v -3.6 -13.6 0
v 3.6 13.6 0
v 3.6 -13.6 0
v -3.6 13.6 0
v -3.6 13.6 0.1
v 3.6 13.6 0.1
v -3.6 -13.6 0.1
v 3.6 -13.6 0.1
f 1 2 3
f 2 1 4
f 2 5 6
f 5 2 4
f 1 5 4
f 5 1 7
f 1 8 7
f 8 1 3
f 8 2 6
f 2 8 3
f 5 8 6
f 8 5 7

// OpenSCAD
// file: ../p/box5-12.scad
use <../lib.scad>
function ldraw_lib__box5_12() = [
// 0 Box with 5 Faces without Any Edges
// 0 Name: box5-12.dat
// 0 Author: Chris Dee [cwdee]
// 0 !LDRAW_ORG Primitive UPDATE 2009-02
// 0 !LICENSE Licensed under CC BY 2.0 and CC BY 4.0 : see CAreadme.txt
// 
// 0 BFC CERTIFY CCW
  [0,"BFC","CERTIFY"],
  [0,"BFC","CCW"],
// 
// 0 !HISTORY 2009-09-03 [PTadmin] Official Update 2009-02
// 
// 
// 4 16 1 1 1 1 1 -1 -1 1 -1 -1 1 1
  [4,16,1,1,1,1,1,-1,-1,1,-1,-1,1,1],
// 4 16 -1 0 1 1 0 1 1 1 1 -1 1 1
  [4,16,-1,0,1,1,0,1,1,1,1,-1,1,1],
// 4 16 -1 0 -1 -1 0 1 -1 1 1 -1 1 -1
  [4,16,-1,0,-1,-1,0,1,-1,1,1,-1,1,-1],
// 4 16 1 0 -1 -1 0 -1 -1 1 -1 1 1 -1
  [4,16,1,0,-1,-1,0,-1,-1,1,-1,1,1,-1],
// 4 16 1 0 1 1 0 -1 1 1 -1 1 1 1
  [4,16,1,0,1,1,0,-1,1,1,-1,1,1,1],
// 0
];
makepoly(ldraw_lib__box5_12(), line=0.2);
// main file
use <../lib.scad>
use <../p/box5-12.scad>
function ldraw_lib__6153754q() = [
// 0 Sticker  3.4 x  0.9 with Dark Azure Volkswagen Rear Window Shape
// 0 Name: 6153754q.dat
// 0 Author: Magnus Forsberg [MagFors]
// 0 !LDRAW_ORG Part UPDATE 2016-01
// 0 !LICENSE Licensed under CC BY 2.0 and CC BY 4.0 : see CAreadme.txt
// 
// 0 BFC CERTIFY CCW
  [0,"BFC","CERTIFY"],
  [0,"BFC","CCW"],
// 
// 0 !KEYWORDS Beetle, set 10252, VW
// 
// 0 !HISTORY 2016-12-31 [PTadmin] Official Update 2016-01
// 
// 
// 1 16 0 -0.25 0 9 0 0 0 0.25 0 0 0 34 box5-12.dat
  [1,16,0,-0.25,0,9,0,0,0,0.25,0,0,0,34, ldraw_lib__box5_12()],
// 0 BFC NOCLIP
  [0,"BFC","NOCLIP"],
// 4 321 -9 -0.25 34 -9 -0.25 -34 9 -0.25 -34 9 -0.25 34
  [4,321,-9,-0.25,34,-9,-0.25,-34,9,-0.25,-34,9,-0.25,34],
];
makepoly(ldraw_lib__6153754q(), line=0.2);
